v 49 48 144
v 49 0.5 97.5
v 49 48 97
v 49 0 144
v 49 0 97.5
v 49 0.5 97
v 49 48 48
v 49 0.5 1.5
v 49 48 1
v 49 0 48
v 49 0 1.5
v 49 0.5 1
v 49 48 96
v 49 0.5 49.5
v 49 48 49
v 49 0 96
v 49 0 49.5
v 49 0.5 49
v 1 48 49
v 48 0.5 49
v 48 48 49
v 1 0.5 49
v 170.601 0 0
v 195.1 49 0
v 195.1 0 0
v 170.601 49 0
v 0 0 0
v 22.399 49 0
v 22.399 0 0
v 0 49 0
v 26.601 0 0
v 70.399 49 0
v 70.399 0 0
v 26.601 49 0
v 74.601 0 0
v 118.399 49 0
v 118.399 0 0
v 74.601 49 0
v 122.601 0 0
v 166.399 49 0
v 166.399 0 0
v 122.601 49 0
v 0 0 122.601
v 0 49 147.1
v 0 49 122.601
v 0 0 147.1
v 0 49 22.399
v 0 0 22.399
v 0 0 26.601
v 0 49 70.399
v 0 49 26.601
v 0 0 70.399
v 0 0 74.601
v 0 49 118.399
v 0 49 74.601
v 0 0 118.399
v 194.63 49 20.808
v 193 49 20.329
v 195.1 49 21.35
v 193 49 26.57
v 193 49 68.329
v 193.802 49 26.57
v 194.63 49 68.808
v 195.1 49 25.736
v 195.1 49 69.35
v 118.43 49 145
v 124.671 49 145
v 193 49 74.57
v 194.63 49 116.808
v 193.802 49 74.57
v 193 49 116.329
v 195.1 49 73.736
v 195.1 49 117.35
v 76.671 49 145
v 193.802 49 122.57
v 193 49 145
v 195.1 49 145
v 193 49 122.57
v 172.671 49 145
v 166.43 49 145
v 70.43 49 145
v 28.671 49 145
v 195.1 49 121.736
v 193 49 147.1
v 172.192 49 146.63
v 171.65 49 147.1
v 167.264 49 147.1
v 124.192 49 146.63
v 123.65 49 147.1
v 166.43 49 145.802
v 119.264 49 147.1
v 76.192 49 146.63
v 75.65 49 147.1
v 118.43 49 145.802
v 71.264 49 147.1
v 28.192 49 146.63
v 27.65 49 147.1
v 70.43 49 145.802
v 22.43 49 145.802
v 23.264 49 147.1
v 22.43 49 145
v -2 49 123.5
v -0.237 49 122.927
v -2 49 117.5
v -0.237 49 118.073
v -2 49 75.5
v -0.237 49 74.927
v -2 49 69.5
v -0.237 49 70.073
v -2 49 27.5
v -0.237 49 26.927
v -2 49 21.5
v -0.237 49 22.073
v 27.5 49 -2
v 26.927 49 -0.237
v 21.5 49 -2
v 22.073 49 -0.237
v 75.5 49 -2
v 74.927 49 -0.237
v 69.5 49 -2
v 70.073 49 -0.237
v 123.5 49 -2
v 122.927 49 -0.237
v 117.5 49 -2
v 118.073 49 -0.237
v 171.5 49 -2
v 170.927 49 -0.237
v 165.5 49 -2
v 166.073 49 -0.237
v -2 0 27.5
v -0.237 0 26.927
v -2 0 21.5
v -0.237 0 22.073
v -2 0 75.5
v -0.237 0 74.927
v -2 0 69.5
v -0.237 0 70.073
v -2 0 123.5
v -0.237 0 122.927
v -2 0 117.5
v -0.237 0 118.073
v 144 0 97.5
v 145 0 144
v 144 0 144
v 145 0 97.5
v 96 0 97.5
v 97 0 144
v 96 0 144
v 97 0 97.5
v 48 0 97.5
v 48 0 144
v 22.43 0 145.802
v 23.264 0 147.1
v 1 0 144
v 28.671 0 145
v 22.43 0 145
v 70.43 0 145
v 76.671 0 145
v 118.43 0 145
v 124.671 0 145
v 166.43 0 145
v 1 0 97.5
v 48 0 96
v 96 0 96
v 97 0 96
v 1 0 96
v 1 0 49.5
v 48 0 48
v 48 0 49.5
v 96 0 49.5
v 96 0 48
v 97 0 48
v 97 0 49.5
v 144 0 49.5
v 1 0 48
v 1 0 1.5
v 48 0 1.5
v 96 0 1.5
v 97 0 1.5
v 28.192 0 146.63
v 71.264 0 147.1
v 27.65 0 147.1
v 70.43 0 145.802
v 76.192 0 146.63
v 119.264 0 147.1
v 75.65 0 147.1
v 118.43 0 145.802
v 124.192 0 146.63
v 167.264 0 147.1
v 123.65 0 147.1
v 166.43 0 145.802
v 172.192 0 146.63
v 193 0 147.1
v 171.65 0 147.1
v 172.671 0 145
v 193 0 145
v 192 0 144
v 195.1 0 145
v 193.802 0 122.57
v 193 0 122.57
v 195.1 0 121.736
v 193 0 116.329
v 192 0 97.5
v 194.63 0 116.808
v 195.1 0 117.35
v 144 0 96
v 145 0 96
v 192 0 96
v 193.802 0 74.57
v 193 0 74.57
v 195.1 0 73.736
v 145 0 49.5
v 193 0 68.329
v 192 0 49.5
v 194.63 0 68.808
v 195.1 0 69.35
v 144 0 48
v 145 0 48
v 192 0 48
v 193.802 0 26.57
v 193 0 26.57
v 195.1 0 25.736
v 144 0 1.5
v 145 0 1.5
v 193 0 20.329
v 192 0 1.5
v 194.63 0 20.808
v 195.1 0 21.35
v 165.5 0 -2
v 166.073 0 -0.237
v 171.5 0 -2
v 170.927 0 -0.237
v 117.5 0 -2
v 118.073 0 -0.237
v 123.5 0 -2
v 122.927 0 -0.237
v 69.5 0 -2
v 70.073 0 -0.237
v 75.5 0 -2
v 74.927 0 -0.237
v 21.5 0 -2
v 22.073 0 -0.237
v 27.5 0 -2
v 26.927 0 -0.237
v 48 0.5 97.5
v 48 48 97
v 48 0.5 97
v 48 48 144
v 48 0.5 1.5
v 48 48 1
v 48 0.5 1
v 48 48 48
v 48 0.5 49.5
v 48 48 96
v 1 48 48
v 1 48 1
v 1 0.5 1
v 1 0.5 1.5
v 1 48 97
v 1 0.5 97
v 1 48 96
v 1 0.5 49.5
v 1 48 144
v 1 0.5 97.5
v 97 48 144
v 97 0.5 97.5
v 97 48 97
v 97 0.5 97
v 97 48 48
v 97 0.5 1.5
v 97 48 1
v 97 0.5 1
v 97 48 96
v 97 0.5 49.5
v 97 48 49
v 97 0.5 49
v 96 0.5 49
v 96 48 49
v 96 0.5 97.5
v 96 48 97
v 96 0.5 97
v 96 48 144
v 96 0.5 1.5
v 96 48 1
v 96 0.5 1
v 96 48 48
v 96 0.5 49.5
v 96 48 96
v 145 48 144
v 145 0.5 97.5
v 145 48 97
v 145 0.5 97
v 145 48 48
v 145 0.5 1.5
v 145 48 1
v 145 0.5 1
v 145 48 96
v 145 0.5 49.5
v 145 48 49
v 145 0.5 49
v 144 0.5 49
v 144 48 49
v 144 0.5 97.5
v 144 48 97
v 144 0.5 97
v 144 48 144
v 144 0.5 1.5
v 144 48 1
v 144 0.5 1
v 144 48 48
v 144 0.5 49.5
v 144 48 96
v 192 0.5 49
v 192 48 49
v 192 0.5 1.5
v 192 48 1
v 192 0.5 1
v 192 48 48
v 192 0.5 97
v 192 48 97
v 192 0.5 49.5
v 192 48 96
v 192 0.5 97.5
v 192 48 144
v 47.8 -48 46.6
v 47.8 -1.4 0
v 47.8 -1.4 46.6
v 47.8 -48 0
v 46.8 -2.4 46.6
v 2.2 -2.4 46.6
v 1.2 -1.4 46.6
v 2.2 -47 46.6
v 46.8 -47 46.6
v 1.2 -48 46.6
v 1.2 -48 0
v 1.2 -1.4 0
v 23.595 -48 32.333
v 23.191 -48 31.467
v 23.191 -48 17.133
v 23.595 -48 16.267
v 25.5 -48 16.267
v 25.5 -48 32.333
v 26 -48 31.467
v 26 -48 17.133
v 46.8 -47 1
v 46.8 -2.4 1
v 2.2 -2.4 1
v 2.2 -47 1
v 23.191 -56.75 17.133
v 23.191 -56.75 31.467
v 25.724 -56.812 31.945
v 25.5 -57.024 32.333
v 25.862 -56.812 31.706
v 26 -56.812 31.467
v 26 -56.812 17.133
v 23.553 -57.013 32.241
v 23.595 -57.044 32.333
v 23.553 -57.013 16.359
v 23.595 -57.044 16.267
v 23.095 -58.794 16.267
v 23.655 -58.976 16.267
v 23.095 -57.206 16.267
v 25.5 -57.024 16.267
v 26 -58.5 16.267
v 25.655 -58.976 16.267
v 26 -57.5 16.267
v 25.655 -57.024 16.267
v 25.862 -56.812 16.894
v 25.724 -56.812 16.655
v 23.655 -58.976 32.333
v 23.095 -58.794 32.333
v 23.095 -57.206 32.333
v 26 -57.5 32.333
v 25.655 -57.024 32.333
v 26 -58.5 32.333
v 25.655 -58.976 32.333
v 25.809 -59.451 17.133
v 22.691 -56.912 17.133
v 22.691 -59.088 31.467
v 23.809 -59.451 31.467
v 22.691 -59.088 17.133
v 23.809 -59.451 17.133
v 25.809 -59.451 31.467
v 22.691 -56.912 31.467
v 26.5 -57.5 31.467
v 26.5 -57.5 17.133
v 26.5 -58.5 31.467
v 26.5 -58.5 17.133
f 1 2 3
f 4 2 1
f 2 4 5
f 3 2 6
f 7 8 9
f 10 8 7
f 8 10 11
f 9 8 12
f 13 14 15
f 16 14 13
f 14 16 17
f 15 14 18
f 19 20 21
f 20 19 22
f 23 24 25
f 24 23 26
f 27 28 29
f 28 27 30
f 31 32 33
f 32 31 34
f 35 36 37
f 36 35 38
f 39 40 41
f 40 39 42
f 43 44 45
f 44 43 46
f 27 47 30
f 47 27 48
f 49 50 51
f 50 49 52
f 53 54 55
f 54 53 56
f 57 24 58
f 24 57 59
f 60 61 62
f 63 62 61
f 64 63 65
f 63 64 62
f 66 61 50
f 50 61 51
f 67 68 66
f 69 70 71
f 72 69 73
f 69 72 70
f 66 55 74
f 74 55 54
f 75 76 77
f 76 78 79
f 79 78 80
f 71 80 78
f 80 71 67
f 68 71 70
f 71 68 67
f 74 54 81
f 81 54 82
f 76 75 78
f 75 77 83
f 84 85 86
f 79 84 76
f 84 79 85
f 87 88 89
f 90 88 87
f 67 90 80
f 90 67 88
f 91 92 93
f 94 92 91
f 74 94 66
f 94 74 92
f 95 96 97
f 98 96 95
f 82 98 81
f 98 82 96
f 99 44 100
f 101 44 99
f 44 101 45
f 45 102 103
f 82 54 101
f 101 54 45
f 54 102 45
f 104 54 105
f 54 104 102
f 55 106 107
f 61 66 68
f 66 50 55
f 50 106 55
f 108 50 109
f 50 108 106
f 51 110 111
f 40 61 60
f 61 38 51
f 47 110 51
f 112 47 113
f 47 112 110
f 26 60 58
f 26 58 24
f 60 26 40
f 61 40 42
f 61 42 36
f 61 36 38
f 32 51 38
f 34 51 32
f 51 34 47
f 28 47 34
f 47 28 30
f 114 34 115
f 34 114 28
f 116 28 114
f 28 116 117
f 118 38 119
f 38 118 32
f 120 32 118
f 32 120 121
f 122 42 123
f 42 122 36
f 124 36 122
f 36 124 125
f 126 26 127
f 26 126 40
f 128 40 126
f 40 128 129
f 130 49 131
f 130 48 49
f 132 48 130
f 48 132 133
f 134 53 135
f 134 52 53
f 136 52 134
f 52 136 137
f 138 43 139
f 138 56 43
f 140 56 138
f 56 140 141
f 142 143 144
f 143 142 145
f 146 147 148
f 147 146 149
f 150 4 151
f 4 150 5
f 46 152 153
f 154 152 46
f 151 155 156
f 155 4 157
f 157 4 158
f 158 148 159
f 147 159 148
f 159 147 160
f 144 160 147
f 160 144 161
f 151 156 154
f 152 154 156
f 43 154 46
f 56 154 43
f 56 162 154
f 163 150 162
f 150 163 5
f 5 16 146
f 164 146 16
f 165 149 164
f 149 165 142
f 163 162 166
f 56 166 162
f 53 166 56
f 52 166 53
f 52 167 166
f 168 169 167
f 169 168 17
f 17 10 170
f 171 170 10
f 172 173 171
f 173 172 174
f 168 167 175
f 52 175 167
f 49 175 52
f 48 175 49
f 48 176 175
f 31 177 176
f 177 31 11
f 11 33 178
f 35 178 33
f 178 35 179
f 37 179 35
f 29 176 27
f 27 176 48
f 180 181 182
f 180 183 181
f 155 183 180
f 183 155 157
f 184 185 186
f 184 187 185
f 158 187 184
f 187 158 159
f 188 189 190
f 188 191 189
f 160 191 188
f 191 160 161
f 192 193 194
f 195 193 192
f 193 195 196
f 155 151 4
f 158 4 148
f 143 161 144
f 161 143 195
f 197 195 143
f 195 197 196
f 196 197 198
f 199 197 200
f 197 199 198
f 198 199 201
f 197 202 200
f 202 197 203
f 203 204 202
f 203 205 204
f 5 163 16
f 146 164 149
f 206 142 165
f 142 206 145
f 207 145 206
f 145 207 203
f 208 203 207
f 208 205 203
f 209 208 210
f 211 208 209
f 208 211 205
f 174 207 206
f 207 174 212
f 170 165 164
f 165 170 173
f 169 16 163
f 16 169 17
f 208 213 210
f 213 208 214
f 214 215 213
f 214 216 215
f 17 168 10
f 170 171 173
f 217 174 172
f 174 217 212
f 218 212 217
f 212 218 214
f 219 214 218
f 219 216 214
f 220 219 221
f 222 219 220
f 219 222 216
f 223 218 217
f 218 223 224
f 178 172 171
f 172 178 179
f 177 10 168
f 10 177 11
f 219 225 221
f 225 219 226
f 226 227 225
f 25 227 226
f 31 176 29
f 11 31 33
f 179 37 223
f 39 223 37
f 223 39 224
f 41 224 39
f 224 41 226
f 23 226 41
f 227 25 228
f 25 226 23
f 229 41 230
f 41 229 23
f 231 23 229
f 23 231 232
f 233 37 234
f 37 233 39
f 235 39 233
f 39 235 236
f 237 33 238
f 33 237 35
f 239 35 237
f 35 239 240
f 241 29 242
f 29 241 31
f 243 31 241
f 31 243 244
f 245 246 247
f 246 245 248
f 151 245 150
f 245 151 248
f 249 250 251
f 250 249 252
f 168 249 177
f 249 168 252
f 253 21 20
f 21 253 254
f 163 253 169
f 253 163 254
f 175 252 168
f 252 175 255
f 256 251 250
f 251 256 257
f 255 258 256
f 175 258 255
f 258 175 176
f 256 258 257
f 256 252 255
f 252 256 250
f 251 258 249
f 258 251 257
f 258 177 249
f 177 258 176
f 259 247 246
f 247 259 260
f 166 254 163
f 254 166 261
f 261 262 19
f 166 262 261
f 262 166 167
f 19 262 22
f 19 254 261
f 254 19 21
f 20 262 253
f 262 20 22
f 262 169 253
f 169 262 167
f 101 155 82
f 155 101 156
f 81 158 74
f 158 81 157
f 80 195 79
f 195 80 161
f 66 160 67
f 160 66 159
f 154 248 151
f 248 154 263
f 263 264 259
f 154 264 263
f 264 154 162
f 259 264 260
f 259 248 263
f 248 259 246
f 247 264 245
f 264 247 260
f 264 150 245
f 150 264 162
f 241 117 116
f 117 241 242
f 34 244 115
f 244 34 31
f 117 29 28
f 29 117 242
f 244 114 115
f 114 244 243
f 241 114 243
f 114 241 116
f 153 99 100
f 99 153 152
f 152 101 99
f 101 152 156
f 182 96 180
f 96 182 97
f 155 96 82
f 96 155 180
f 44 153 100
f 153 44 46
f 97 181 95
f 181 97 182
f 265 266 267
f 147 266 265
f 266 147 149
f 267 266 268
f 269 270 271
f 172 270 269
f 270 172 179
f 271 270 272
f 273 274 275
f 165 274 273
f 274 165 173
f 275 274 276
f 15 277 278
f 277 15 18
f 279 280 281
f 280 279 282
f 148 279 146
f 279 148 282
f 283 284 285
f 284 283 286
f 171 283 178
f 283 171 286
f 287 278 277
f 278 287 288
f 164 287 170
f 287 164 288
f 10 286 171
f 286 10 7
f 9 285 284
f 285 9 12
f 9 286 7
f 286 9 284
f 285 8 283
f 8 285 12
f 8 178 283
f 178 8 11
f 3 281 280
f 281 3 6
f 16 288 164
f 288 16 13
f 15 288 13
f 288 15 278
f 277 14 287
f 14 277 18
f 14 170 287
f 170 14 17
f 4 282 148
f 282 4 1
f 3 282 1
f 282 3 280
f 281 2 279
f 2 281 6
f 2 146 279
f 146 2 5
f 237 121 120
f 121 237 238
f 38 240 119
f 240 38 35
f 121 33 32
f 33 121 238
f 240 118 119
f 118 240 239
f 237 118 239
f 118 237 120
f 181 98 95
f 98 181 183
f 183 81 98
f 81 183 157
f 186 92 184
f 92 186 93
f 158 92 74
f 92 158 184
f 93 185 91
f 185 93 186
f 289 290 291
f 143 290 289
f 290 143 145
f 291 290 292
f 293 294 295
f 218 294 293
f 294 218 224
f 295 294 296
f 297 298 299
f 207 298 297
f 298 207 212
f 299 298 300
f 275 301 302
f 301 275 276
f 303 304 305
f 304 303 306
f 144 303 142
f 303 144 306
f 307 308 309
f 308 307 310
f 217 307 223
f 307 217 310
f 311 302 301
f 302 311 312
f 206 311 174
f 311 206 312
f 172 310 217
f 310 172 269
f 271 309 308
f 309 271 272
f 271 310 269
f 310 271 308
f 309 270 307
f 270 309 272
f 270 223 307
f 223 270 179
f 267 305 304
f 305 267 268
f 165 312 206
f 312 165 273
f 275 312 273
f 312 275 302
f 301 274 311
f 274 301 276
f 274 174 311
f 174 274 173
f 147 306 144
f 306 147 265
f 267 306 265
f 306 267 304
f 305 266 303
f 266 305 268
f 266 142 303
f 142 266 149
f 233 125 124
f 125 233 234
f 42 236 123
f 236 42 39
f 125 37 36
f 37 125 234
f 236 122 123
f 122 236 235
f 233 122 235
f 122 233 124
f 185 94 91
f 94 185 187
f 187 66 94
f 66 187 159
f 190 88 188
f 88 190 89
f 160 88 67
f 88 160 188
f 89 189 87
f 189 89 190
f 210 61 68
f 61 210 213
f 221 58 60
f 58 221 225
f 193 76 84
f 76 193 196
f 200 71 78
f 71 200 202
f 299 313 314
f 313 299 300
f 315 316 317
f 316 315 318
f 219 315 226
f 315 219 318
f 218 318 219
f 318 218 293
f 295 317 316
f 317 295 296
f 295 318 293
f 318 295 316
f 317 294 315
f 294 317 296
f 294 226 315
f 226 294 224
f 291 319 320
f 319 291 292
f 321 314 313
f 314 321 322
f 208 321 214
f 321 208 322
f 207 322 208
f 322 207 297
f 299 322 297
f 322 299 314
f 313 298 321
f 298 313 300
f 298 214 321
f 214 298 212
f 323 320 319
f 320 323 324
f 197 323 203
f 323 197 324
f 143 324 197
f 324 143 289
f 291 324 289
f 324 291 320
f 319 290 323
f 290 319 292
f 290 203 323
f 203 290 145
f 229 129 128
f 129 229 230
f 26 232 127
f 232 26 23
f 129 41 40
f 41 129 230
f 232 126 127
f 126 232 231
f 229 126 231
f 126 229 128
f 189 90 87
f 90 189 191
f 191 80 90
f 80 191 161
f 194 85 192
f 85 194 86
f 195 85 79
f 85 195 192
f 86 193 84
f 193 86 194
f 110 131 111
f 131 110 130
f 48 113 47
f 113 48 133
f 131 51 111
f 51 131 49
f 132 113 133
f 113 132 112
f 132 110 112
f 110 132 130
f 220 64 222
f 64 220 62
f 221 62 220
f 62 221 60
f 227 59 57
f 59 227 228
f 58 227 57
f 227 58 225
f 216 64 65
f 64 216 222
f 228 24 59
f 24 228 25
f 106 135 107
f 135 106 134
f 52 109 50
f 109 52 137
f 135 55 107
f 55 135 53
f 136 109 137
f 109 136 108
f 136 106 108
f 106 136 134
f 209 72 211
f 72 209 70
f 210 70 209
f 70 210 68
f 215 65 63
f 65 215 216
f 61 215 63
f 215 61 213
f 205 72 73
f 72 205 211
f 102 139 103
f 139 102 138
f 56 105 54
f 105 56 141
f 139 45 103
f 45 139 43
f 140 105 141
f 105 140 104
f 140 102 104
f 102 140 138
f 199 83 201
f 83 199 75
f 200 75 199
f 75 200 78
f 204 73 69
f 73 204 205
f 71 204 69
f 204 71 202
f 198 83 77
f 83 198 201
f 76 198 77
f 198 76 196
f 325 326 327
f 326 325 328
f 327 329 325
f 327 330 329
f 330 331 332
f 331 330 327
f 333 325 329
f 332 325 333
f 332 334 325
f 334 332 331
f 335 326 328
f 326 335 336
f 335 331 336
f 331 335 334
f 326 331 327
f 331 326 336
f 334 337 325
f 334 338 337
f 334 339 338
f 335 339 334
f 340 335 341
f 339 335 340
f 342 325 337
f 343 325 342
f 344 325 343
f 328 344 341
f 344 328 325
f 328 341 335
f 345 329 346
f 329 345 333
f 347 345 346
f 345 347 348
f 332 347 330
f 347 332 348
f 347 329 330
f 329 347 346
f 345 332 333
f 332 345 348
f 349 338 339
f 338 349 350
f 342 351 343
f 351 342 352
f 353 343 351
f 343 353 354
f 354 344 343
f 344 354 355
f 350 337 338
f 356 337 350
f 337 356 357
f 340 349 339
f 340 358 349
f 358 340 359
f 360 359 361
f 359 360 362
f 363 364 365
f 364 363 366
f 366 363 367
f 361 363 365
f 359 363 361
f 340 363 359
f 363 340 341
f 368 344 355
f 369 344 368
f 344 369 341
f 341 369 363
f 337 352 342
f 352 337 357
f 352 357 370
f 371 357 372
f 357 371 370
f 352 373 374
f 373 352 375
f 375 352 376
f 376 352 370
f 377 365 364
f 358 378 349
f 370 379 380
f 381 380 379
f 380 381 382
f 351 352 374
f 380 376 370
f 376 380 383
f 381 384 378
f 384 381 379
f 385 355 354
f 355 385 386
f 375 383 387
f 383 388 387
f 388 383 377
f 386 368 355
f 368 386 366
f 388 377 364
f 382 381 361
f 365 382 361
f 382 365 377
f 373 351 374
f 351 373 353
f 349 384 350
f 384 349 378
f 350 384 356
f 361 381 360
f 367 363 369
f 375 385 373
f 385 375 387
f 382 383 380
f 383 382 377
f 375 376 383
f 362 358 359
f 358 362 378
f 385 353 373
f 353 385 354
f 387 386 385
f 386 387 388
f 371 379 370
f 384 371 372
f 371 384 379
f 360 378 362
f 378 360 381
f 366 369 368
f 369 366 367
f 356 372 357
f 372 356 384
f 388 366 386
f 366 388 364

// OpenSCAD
module cell(w,h,d,c,c1) {
  difference() {
    color([1,.9,.7,1])cube([w,h,d]);
    translate([c,c1,c]) cube([w-2*c,h-c-c1,d-2*c]);
    translate([c,-.1,c+c1]) cube([w-2*c,h-c-.1,d-2*c-c1]);
  }
}

module box(w,h,d,c,handle,ts) {
  color([.4,.1,.1,.9]) difference() {
    cube([w,h,d]);
    translate([c,c,c]) cube([w-2*c,h-2*c,d-c+.1]);
  }
  color([.4,.1,.1,.9]) translate([w/2,-handle[1],c+h/2]) {
    translate([0, 5,0]) minkowski() {
      cube(handle, center=true);
      sphere(c);
    };
    minkowski() {
      cube([handle[0]*2,handle[0],handle[2]], center=true);
      sphere(c);
    };
  }
}

module male(h,w,d) {
    translate([h/2,0,-d/2]) difference() {
        translate([0,0,0]) rotate([-90,0,0]) cylinder(d=d,h=w);
        translate([-d/2,-1,-d]) cube([d,w+2,d]);
    }
}

module female(h,w,d) {
    difference() {
        cube([h,w,d/2-c]);
        translate([0,-1,d/2]) male(h+2,w+2,d+.2);
    }
}

module rack(size, w, h, d, c, c1) {
  for (x = [0:size[0]-1]) {
    for (y = [0:size[1]-1]) {
      translate([x*(w-c),0,y*(h-c)]) cell(w,d,h,c,c1);
    }
    translate([x*(w-c),0,c]) male(w,d,6);
    translate([x*(w-c),0,(size[1]*(h-c))+c]) female(w,d,6.2);
  }
  for (y = [0:size[1]-1]) {
    translate([c,0,h+y*(h-c)]) rotate([0,90,0]) male(h,d,6);
    translate([(size[0]*(w-c))+c,0,h+y*(h-c)]) rotate([0,90,0]) female(h,d,6.2);
  }
}

w = 49;
h = 49;
d = 49;
c = 1;
c1 = .5;
s = .2;

rack([4,3],w,h,d,c,c1);

translate([c+s,-h+c,0]) box(w-2*c-2*s,d-2*c-2*s,h-2*c-2*s,c,[1,10,h/3-2*c],6);
